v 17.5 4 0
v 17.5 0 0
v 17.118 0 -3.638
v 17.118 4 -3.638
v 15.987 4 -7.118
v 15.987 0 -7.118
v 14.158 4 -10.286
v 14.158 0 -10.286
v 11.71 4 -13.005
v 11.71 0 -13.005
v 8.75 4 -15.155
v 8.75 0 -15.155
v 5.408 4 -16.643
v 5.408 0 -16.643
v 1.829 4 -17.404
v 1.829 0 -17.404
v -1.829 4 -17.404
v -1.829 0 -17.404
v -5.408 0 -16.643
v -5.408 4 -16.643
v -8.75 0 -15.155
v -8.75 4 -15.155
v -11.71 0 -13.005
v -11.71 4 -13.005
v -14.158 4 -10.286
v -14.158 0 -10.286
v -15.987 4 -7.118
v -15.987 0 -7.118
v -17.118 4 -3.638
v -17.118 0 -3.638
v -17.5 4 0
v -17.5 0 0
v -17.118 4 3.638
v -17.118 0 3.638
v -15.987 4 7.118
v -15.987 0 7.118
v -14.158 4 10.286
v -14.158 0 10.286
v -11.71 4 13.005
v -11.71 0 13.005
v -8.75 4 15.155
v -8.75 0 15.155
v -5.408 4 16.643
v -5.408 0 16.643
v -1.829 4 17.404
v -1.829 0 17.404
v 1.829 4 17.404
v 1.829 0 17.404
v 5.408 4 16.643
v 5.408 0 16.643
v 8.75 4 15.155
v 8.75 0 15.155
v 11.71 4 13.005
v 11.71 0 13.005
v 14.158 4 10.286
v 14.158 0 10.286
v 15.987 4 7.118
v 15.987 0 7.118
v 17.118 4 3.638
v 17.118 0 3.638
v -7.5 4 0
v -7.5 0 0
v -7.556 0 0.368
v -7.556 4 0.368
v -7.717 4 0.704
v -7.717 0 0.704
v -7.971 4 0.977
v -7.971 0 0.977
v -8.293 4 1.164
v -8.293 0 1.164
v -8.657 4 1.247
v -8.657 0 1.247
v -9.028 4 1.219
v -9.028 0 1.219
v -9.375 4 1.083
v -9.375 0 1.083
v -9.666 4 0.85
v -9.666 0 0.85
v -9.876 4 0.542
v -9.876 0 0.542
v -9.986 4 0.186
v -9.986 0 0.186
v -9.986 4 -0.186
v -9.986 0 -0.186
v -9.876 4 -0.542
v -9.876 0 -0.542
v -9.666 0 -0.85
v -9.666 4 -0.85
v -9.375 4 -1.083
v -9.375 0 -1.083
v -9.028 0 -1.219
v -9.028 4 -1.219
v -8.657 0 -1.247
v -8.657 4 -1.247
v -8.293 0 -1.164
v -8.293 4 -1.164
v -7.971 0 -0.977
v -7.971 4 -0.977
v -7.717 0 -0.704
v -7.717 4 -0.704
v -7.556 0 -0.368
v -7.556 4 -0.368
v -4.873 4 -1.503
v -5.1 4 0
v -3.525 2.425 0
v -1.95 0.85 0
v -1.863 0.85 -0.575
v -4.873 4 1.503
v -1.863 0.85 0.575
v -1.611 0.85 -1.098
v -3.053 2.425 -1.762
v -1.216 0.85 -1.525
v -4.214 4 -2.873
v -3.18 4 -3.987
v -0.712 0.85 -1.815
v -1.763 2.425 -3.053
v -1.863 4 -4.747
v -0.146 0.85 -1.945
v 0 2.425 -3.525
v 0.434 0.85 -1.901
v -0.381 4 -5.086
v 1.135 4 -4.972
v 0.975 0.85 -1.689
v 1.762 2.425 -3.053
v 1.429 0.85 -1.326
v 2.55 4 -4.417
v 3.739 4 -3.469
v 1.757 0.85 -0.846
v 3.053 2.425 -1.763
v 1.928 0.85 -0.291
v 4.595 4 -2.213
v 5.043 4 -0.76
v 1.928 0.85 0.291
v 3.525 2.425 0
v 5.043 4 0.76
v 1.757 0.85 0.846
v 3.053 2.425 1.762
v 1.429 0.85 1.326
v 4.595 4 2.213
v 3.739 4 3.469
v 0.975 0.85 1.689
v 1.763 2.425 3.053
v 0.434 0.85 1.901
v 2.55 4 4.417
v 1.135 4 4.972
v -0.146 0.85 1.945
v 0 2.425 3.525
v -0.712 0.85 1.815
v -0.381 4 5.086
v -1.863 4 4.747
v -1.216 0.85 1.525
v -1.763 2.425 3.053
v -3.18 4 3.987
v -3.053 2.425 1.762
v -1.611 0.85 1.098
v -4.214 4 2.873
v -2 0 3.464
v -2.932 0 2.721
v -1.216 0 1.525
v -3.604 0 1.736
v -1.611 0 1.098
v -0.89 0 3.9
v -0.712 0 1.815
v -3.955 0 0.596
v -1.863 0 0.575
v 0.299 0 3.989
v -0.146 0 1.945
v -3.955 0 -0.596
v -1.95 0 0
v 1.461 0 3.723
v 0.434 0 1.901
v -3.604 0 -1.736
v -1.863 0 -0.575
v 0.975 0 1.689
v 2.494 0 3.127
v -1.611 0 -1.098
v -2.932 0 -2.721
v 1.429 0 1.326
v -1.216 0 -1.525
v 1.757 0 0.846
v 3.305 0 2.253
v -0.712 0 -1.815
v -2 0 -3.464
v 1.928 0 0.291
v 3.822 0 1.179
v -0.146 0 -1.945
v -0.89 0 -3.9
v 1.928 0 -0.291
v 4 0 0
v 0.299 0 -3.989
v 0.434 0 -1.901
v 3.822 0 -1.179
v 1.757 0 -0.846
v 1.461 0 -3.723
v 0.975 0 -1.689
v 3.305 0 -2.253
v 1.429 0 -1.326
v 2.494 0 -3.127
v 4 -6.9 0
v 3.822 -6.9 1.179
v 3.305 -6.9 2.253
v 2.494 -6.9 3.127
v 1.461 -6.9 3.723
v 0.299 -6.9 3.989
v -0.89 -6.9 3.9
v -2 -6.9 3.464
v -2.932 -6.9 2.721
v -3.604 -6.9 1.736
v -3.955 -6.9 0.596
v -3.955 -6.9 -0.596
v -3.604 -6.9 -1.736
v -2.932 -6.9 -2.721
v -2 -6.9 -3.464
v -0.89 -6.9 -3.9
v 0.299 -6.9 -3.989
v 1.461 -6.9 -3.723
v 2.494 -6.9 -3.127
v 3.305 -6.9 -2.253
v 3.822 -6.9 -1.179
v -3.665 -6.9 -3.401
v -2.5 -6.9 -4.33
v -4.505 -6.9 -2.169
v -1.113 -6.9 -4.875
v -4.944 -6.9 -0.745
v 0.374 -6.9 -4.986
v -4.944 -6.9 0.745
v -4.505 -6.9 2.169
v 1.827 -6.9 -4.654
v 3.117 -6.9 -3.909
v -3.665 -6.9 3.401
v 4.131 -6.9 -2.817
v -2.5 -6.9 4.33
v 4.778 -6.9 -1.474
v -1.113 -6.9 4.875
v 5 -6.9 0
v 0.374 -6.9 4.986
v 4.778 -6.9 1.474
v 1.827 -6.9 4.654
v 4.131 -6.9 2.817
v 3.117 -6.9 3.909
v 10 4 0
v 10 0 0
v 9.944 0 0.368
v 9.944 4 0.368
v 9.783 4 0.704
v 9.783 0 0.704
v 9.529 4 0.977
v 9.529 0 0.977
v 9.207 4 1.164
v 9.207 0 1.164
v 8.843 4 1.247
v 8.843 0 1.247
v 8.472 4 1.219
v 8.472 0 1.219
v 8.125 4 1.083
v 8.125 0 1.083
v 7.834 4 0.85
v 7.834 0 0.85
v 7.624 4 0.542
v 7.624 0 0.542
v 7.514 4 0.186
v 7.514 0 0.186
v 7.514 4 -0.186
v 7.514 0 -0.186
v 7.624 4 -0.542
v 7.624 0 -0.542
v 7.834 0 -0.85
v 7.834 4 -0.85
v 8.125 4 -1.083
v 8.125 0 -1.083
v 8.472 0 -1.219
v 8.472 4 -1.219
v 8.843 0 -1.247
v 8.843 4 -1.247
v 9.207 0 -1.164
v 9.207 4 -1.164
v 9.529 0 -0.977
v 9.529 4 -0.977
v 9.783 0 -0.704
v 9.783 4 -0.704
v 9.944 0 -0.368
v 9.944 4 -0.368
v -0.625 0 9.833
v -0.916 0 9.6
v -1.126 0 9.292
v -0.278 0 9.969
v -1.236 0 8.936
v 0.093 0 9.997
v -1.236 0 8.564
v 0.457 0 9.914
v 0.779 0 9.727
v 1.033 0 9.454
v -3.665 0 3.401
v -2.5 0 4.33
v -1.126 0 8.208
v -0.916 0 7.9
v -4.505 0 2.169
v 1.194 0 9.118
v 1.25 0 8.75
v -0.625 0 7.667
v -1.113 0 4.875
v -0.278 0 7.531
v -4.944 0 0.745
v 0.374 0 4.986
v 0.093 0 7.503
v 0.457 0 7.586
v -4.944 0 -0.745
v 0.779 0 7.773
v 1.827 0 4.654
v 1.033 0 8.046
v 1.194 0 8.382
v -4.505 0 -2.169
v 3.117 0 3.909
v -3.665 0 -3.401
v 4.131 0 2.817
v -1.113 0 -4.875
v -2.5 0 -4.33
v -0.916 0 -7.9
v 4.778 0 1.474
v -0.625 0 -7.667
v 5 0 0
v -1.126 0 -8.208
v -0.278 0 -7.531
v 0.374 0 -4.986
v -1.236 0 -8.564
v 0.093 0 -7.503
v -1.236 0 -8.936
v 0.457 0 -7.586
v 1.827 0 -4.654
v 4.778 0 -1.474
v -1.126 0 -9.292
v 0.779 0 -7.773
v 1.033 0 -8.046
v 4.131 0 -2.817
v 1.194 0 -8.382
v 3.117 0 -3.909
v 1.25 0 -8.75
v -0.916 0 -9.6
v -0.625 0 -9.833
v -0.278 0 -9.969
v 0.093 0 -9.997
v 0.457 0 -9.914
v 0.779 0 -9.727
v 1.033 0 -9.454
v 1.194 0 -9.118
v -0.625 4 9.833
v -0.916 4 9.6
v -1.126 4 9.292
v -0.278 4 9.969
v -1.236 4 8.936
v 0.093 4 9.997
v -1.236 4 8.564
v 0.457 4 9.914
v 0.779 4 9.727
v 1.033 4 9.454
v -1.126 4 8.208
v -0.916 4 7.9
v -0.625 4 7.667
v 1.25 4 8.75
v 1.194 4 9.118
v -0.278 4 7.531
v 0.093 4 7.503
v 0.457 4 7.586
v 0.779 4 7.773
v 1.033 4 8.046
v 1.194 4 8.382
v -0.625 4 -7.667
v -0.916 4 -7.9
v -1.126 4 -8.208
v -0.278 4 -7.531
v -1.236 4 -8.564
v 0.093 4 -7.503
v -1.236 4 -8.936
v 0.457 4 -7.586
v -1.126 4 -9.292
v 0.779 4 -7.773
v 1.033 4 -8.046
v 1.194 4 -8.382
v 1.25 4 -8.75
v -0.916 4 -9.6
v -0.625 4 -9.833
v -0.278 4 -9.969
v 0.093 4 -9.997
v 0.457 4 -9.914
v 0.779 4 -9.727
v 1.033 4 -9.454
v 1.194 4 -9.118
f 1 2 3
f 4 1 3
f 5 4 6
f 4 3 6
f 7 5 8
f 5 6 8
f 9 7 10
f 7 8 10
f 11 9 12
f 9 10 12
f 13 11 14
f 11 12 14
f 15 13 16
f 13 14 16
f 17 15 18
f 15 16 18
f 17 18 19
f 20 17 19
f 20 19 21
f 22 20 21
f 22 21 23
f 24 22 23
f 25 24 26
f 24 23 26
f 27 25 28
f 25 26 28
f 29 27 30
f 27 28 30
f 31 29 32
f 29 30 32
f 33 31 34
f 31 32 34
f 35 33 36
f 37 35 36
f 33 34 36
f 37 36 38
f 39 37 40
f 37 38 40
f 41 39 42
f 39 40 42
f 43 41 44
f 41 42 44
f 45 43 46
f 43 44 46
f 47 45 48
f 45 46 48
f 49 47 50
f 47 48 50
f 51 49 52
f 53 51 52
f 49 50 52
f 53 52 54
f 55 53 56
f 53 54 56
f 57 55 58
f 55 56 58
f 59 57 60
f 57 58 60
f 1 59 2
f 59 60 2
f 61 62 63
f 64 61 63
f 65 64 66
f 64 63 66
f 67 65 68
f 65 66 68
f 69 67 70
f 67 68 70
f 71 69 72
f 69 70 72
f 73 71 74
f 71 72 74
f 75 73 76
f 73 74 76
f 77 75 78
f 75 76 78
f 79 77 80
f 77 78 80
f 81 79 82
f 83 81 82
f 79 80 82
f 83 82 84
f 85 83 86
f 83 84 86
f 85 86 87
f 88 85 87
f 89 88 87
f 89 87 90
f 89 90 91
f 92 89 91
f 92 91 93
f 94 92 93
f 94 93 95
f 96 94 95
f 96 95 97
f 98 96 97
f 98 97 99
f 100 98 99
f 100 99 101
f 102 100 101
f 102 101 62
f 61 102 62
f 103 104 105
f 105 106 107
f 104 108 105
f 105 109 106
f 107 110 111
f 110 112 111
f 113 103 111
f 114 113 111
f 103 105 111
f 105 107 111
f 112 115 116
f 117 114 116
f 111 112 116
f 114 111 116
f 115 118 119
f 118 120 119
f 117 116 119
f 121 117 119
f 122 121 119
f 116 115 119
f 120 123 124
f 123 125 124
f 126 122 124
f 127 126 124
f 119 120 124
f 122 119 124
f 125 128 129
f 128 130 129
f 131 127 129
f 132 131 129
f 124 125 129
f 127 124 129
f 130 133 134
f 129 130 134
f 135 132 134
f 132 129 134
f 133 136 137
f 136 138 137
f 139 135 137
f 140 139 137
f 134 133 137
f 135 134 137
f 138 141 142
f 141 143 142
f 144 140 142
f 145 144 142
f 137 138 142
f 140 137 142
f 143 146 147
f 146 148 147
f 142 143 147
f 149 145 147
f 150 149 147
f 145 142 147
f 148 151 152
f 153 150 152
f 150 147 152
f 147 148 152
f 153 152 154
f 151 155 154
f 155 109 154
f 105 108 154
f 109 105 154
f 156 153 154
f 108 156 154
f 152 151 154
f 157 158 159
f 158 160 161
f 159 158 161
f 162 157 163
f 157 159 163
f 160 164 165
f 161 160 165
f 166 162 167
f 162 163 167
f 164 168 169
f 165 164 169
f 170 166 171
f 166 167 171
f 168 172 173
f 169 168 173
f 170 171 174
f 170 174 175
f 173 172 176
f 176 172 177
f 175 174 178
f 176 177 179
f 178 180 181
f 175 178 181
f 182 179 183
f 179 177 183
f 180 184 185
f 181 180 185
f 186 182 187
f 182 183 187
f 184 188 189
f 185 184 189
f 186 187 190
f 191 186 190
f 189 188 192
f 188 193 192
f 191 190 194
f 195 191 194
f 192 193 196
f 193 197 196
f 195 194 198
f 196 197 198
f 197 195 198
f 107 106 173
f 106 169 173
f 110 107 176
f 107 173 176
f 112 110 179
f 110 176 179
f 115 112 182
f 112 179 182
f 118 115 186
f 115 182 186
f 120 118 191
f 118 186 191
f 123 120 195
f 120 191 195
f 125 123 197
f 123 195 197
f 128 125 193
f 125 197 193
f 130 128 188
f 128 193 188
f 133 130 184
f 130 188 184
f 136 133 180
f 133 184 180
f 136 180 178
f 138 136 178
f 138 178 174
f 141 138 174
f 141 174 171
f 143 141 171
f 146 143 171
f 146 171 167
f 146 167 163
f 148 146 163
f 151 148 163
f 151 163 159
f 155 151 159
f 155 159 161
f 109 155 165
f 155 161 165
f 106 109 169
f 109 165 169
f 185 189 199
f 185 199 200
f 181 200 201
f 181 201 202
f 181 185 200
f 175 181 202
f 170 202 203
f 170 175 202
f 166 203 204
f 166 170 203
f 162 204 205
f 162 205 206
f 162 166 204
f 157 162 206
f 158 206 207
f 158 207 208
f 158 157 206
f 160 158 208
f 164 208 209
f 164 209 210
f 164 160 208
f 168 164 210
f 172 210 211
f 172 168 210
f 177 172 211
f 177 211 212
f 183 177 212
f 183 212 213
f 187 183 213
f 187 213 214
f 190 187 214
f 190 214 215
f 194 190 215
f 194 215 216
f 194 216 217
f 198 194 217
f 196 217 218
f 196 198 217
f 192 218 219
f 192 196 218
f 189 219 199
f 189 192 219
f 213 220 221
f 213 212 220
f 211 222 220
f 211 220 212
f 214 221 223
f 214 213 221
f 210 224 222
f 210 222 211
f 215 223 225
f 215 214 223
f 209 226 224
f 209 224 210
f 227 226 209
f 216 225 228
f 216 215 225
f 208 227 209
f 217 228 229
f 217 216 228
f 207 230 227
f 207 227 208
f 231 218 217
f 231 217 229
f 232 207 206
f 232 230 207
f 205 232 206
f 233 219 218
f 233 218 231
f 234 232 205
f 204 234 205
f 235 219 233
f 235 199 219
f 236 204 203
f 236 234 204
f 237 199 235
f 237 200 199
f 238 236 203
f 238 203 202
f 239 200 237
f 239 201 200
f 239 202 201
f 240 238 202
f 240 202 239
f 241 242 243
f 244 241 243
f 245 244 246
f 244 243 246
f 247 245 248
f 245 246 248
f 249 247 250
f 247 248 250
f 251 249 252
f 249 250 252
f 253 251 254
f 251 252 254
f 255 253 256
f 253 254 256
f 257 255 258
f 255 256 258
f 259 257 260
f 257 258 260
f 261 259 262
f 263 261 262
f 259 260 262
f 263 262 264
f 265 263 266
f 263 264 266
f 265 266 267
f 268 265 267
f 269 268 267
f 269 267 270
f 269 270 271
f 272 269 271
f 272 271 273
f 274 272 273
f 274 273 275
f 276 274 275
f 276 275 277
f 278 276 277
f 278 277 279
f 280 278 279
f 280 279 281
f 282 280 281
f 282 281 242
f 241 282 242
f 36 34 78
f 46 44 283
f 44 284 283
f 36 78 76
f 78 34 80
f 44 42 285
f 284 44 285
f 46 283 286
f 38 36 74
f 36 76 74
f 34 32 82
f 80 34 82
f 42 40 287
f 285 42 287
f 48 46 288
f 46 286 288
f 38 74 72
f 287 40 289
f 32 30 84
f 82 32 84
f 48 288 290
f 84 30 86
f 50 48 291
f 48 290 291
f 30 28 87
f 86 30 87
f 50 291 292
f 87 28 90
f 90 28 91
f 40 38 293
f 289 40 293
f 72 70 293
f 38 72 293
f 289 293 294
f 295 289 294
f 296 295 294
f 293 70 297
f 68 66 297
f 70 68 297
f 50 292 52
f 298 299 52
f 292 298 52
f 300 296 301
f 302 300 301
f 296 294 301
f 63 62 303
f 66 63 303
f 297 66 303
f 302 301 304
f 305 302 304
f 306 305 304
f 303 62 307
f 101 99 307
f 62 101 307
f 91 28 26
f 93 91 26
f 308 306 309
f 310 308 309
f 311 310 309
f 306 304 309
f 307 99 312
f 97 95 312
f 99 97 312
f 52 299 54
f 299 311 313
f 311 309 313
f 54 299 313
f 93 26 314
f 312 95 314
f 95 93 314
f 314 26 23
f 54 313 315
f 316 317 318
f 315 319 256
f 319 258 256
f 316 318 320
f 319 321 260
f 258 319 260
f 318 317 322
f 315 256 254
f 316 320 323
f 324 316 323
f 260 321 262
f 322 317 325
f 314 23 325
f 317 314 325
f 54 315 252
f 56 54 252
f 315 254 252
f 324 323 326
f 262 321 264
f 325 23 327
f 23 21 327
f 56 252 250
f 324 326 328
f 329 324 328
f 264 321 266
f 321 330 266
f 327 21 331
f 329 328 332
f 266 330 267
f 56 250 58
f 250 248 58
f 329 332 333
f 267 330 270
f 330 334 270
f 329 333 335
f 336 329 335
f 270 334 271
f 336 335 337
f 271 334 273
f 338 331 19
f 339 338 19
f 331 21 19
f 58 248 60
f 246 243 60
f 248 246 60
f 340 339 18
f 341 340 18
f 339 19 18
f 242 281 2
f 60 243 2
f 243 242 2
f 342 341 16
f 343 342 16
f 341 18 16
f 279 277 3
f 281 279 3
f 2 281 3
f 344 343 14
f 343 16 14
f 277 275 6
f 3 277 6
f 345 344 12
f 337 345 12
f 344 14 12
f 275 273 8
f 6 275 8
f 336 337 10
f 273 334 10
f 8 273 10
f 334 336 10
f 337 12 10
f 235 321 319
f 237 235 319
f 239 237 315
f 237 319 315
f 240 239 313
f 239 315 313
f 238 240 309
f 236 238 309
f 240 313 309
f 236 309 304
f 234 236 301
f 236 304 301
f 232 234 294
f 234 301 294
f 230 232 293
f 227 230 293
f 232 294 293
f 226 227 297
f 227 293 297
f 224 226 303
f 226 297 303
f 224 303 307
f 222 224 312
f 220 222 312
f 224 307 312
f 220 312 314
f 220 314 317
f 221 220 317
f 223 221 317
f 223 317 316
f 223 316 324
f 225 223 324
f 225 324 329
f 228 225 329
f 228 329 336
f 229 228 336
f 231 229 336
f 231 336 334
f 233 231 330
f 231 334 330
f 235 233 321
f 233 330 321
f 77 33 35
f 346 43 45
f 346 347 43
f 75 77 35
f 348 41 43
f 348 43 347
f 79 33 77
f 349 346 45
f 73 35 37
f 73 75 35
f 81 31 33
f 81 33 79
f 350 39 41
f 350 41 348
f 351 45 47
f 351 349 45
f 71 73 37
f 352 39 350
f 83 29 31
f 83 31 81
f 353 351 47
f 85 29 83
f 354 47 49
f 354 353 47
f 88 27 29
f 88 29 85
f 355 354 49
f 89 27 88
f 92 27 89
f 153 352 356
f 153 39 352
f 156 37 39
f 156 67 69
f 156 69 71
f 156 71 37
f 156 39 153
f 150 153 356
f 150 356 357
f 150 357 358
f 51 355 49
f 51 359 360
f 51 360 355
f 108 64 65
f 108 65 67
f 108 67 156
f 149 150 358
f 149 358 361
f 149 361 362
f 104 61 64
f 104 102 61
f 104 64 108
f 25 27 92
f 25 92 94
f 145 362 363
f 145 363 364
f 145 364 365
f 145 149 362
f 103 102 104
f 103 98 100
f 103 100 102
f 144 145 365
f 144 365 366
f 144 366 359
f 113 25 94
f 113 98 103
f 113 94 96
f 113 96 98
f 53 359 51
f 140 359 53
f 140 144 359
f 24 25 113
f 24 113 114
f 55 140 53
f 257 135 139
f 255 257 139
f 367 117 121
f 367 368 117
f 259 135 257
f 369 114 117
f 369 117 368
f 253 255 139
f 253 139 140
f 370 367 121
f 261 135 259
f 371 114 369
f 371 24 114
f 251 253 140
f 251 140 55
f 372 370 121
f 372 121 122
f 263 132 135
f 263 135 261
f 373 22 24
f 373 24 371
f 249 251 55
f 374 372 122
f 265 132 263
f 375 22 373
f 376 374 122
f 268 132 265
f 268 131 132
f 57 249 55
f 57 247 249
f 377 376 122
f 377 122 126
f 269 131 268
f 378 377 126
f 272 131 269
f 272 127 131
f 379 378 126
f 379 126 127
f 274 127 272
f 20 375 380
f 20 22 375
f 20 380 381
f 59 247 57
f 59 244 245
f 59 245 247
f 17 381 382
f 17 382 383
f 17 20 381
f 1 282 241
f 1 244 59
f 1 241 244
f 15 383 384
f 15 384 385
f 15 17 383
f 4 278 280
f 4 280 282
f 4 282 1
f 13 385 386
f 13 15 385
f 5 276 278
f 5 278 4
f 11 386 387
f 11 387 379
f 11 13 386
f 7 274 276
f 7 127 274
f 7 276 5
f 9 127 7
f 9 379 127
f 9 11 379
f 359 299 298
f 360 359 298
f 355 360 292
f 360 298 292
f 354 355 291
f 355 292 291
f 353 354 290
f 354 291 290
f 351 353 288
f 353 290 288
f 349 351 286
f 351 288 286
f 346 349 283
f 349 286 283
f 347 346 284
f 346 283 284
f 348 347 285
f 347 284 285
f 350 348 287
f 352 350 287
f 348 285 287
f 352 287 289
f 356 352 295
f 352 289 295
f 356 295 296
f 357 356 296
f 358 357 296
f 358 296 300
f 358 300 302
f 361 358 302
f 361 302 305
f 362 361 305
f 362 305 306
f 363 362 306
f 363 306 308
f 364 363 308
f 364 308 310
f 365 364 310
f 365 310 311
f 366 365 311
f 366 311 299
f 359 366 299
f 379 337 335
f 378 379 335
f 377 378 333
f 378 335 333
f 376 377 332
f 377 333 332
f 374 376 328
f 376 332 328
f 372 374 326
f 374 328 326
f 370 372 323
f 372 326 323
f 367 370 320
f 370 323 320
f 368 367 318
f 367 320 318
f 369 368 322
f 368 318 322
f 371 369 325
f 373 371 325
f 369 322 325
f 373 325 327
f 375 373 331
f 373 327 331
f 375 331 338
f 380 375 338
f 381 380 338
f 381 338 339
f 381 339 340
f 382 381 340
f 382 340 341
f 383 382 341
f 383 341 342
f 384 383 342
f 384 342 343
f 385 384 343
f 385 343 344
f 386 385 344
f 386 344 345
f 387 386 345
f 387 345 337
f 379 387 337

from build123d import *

# Parameters (mm, degrees)
SKETCH1_R                                         = 17.5
BOSS_EXTRUDE1_DEPTH                               = 4
SKETCH2_R                                         = 5
SKETCH2_R_2                                       = 4
BOSS_EXTRUDE2_DEPTH                               = 6.9
SKETCH3_R                                         = 1.25
CUT_EXTRUDE1_DEPTH                                = 6.9
CSK_FOR_M3_5_FLAT_HEAD_MACHINE_SCREW1_D           = 3.9
CSK_FOR_M3_5_FLAT_HEAD_MACHINE_SCREW1_CSINK_D     = 10.2
CSK_FOR_M3_5_FLAT_HEAD_MACHINE_SCREW1_CSINK_ANGLE = 90
SKETCH6_R                                         = 1.25
CUT_EXTRUDE2_DEPTH                                = 6.9


with BuildPart() as part:
    # Sketch1 → Boss-Extrude1 (new body)
    with BuildSketch(Plane(origin=(0, 0, 0), x_dir=(1, 0, 0), z_dir=(0, 1, 0))):
        Circle(SKETCH1_R)
    extrude(amount=BOSS_EXTRUDE1_DEPTH)

    # Sketch2 → Boss-Extrude2 (add)
    with BuildSketch(Plane.XZ):
        Circle(SKETCH2_R)
        Circle(SKETCH2_R_2, mode=Mode.SUBTRACT)
    extrude(amount=BOSS_EXTRUDE2_DEPTH)

    # Sketch3 → Cut-Extrude1 (cut)
    with BuildSketch(Plane.XZ):
        with Locations((-8.75, 0)):
            Circle(SKETCH3_R)
        with Locations((8.75, 0)):
            Circle(SKETCH3_R)
    extrude(amount=-CUT_EXTRUDE1_DEPTH, mode=Mode.SUBTRACT)

    # CSK for M3.5 Flat Head Machine Screw1 (through all)
    with Locations(Plane(origin=(0, 4, 0), x_dir=(1, 0, 0), z_dir=(0, 1, 0))):
        with Locations((0, 0)):
            CounterSinkHole(CSK_FOR_M3_5_FLAT_HEAD_MACHINE_SCREW1_D / 2, CSK_FOR_M3_5_FLAT_HEAD_MACHINE_SCREW1_CSINK_D / 2, counter_sink_angle=CSK_FOR_M3_5_FLAT_HEAD_MACHINE_SCREW1_CSINK_ANGLE)

    # Sketch6 → Cut-Extrude2 (cut)
    with BuildSketch(Plane.XZ):
        with Locations((0, 8.75)):
            Circle(SKETCH6_R)
        with Locations((0, -8.75)):
            Circle(SKETCH6_R)
    extrude(amount=-CUT_EXTRUDE2_DEPTH, mode=Mode.SUBTRACT)


solid = part.part
